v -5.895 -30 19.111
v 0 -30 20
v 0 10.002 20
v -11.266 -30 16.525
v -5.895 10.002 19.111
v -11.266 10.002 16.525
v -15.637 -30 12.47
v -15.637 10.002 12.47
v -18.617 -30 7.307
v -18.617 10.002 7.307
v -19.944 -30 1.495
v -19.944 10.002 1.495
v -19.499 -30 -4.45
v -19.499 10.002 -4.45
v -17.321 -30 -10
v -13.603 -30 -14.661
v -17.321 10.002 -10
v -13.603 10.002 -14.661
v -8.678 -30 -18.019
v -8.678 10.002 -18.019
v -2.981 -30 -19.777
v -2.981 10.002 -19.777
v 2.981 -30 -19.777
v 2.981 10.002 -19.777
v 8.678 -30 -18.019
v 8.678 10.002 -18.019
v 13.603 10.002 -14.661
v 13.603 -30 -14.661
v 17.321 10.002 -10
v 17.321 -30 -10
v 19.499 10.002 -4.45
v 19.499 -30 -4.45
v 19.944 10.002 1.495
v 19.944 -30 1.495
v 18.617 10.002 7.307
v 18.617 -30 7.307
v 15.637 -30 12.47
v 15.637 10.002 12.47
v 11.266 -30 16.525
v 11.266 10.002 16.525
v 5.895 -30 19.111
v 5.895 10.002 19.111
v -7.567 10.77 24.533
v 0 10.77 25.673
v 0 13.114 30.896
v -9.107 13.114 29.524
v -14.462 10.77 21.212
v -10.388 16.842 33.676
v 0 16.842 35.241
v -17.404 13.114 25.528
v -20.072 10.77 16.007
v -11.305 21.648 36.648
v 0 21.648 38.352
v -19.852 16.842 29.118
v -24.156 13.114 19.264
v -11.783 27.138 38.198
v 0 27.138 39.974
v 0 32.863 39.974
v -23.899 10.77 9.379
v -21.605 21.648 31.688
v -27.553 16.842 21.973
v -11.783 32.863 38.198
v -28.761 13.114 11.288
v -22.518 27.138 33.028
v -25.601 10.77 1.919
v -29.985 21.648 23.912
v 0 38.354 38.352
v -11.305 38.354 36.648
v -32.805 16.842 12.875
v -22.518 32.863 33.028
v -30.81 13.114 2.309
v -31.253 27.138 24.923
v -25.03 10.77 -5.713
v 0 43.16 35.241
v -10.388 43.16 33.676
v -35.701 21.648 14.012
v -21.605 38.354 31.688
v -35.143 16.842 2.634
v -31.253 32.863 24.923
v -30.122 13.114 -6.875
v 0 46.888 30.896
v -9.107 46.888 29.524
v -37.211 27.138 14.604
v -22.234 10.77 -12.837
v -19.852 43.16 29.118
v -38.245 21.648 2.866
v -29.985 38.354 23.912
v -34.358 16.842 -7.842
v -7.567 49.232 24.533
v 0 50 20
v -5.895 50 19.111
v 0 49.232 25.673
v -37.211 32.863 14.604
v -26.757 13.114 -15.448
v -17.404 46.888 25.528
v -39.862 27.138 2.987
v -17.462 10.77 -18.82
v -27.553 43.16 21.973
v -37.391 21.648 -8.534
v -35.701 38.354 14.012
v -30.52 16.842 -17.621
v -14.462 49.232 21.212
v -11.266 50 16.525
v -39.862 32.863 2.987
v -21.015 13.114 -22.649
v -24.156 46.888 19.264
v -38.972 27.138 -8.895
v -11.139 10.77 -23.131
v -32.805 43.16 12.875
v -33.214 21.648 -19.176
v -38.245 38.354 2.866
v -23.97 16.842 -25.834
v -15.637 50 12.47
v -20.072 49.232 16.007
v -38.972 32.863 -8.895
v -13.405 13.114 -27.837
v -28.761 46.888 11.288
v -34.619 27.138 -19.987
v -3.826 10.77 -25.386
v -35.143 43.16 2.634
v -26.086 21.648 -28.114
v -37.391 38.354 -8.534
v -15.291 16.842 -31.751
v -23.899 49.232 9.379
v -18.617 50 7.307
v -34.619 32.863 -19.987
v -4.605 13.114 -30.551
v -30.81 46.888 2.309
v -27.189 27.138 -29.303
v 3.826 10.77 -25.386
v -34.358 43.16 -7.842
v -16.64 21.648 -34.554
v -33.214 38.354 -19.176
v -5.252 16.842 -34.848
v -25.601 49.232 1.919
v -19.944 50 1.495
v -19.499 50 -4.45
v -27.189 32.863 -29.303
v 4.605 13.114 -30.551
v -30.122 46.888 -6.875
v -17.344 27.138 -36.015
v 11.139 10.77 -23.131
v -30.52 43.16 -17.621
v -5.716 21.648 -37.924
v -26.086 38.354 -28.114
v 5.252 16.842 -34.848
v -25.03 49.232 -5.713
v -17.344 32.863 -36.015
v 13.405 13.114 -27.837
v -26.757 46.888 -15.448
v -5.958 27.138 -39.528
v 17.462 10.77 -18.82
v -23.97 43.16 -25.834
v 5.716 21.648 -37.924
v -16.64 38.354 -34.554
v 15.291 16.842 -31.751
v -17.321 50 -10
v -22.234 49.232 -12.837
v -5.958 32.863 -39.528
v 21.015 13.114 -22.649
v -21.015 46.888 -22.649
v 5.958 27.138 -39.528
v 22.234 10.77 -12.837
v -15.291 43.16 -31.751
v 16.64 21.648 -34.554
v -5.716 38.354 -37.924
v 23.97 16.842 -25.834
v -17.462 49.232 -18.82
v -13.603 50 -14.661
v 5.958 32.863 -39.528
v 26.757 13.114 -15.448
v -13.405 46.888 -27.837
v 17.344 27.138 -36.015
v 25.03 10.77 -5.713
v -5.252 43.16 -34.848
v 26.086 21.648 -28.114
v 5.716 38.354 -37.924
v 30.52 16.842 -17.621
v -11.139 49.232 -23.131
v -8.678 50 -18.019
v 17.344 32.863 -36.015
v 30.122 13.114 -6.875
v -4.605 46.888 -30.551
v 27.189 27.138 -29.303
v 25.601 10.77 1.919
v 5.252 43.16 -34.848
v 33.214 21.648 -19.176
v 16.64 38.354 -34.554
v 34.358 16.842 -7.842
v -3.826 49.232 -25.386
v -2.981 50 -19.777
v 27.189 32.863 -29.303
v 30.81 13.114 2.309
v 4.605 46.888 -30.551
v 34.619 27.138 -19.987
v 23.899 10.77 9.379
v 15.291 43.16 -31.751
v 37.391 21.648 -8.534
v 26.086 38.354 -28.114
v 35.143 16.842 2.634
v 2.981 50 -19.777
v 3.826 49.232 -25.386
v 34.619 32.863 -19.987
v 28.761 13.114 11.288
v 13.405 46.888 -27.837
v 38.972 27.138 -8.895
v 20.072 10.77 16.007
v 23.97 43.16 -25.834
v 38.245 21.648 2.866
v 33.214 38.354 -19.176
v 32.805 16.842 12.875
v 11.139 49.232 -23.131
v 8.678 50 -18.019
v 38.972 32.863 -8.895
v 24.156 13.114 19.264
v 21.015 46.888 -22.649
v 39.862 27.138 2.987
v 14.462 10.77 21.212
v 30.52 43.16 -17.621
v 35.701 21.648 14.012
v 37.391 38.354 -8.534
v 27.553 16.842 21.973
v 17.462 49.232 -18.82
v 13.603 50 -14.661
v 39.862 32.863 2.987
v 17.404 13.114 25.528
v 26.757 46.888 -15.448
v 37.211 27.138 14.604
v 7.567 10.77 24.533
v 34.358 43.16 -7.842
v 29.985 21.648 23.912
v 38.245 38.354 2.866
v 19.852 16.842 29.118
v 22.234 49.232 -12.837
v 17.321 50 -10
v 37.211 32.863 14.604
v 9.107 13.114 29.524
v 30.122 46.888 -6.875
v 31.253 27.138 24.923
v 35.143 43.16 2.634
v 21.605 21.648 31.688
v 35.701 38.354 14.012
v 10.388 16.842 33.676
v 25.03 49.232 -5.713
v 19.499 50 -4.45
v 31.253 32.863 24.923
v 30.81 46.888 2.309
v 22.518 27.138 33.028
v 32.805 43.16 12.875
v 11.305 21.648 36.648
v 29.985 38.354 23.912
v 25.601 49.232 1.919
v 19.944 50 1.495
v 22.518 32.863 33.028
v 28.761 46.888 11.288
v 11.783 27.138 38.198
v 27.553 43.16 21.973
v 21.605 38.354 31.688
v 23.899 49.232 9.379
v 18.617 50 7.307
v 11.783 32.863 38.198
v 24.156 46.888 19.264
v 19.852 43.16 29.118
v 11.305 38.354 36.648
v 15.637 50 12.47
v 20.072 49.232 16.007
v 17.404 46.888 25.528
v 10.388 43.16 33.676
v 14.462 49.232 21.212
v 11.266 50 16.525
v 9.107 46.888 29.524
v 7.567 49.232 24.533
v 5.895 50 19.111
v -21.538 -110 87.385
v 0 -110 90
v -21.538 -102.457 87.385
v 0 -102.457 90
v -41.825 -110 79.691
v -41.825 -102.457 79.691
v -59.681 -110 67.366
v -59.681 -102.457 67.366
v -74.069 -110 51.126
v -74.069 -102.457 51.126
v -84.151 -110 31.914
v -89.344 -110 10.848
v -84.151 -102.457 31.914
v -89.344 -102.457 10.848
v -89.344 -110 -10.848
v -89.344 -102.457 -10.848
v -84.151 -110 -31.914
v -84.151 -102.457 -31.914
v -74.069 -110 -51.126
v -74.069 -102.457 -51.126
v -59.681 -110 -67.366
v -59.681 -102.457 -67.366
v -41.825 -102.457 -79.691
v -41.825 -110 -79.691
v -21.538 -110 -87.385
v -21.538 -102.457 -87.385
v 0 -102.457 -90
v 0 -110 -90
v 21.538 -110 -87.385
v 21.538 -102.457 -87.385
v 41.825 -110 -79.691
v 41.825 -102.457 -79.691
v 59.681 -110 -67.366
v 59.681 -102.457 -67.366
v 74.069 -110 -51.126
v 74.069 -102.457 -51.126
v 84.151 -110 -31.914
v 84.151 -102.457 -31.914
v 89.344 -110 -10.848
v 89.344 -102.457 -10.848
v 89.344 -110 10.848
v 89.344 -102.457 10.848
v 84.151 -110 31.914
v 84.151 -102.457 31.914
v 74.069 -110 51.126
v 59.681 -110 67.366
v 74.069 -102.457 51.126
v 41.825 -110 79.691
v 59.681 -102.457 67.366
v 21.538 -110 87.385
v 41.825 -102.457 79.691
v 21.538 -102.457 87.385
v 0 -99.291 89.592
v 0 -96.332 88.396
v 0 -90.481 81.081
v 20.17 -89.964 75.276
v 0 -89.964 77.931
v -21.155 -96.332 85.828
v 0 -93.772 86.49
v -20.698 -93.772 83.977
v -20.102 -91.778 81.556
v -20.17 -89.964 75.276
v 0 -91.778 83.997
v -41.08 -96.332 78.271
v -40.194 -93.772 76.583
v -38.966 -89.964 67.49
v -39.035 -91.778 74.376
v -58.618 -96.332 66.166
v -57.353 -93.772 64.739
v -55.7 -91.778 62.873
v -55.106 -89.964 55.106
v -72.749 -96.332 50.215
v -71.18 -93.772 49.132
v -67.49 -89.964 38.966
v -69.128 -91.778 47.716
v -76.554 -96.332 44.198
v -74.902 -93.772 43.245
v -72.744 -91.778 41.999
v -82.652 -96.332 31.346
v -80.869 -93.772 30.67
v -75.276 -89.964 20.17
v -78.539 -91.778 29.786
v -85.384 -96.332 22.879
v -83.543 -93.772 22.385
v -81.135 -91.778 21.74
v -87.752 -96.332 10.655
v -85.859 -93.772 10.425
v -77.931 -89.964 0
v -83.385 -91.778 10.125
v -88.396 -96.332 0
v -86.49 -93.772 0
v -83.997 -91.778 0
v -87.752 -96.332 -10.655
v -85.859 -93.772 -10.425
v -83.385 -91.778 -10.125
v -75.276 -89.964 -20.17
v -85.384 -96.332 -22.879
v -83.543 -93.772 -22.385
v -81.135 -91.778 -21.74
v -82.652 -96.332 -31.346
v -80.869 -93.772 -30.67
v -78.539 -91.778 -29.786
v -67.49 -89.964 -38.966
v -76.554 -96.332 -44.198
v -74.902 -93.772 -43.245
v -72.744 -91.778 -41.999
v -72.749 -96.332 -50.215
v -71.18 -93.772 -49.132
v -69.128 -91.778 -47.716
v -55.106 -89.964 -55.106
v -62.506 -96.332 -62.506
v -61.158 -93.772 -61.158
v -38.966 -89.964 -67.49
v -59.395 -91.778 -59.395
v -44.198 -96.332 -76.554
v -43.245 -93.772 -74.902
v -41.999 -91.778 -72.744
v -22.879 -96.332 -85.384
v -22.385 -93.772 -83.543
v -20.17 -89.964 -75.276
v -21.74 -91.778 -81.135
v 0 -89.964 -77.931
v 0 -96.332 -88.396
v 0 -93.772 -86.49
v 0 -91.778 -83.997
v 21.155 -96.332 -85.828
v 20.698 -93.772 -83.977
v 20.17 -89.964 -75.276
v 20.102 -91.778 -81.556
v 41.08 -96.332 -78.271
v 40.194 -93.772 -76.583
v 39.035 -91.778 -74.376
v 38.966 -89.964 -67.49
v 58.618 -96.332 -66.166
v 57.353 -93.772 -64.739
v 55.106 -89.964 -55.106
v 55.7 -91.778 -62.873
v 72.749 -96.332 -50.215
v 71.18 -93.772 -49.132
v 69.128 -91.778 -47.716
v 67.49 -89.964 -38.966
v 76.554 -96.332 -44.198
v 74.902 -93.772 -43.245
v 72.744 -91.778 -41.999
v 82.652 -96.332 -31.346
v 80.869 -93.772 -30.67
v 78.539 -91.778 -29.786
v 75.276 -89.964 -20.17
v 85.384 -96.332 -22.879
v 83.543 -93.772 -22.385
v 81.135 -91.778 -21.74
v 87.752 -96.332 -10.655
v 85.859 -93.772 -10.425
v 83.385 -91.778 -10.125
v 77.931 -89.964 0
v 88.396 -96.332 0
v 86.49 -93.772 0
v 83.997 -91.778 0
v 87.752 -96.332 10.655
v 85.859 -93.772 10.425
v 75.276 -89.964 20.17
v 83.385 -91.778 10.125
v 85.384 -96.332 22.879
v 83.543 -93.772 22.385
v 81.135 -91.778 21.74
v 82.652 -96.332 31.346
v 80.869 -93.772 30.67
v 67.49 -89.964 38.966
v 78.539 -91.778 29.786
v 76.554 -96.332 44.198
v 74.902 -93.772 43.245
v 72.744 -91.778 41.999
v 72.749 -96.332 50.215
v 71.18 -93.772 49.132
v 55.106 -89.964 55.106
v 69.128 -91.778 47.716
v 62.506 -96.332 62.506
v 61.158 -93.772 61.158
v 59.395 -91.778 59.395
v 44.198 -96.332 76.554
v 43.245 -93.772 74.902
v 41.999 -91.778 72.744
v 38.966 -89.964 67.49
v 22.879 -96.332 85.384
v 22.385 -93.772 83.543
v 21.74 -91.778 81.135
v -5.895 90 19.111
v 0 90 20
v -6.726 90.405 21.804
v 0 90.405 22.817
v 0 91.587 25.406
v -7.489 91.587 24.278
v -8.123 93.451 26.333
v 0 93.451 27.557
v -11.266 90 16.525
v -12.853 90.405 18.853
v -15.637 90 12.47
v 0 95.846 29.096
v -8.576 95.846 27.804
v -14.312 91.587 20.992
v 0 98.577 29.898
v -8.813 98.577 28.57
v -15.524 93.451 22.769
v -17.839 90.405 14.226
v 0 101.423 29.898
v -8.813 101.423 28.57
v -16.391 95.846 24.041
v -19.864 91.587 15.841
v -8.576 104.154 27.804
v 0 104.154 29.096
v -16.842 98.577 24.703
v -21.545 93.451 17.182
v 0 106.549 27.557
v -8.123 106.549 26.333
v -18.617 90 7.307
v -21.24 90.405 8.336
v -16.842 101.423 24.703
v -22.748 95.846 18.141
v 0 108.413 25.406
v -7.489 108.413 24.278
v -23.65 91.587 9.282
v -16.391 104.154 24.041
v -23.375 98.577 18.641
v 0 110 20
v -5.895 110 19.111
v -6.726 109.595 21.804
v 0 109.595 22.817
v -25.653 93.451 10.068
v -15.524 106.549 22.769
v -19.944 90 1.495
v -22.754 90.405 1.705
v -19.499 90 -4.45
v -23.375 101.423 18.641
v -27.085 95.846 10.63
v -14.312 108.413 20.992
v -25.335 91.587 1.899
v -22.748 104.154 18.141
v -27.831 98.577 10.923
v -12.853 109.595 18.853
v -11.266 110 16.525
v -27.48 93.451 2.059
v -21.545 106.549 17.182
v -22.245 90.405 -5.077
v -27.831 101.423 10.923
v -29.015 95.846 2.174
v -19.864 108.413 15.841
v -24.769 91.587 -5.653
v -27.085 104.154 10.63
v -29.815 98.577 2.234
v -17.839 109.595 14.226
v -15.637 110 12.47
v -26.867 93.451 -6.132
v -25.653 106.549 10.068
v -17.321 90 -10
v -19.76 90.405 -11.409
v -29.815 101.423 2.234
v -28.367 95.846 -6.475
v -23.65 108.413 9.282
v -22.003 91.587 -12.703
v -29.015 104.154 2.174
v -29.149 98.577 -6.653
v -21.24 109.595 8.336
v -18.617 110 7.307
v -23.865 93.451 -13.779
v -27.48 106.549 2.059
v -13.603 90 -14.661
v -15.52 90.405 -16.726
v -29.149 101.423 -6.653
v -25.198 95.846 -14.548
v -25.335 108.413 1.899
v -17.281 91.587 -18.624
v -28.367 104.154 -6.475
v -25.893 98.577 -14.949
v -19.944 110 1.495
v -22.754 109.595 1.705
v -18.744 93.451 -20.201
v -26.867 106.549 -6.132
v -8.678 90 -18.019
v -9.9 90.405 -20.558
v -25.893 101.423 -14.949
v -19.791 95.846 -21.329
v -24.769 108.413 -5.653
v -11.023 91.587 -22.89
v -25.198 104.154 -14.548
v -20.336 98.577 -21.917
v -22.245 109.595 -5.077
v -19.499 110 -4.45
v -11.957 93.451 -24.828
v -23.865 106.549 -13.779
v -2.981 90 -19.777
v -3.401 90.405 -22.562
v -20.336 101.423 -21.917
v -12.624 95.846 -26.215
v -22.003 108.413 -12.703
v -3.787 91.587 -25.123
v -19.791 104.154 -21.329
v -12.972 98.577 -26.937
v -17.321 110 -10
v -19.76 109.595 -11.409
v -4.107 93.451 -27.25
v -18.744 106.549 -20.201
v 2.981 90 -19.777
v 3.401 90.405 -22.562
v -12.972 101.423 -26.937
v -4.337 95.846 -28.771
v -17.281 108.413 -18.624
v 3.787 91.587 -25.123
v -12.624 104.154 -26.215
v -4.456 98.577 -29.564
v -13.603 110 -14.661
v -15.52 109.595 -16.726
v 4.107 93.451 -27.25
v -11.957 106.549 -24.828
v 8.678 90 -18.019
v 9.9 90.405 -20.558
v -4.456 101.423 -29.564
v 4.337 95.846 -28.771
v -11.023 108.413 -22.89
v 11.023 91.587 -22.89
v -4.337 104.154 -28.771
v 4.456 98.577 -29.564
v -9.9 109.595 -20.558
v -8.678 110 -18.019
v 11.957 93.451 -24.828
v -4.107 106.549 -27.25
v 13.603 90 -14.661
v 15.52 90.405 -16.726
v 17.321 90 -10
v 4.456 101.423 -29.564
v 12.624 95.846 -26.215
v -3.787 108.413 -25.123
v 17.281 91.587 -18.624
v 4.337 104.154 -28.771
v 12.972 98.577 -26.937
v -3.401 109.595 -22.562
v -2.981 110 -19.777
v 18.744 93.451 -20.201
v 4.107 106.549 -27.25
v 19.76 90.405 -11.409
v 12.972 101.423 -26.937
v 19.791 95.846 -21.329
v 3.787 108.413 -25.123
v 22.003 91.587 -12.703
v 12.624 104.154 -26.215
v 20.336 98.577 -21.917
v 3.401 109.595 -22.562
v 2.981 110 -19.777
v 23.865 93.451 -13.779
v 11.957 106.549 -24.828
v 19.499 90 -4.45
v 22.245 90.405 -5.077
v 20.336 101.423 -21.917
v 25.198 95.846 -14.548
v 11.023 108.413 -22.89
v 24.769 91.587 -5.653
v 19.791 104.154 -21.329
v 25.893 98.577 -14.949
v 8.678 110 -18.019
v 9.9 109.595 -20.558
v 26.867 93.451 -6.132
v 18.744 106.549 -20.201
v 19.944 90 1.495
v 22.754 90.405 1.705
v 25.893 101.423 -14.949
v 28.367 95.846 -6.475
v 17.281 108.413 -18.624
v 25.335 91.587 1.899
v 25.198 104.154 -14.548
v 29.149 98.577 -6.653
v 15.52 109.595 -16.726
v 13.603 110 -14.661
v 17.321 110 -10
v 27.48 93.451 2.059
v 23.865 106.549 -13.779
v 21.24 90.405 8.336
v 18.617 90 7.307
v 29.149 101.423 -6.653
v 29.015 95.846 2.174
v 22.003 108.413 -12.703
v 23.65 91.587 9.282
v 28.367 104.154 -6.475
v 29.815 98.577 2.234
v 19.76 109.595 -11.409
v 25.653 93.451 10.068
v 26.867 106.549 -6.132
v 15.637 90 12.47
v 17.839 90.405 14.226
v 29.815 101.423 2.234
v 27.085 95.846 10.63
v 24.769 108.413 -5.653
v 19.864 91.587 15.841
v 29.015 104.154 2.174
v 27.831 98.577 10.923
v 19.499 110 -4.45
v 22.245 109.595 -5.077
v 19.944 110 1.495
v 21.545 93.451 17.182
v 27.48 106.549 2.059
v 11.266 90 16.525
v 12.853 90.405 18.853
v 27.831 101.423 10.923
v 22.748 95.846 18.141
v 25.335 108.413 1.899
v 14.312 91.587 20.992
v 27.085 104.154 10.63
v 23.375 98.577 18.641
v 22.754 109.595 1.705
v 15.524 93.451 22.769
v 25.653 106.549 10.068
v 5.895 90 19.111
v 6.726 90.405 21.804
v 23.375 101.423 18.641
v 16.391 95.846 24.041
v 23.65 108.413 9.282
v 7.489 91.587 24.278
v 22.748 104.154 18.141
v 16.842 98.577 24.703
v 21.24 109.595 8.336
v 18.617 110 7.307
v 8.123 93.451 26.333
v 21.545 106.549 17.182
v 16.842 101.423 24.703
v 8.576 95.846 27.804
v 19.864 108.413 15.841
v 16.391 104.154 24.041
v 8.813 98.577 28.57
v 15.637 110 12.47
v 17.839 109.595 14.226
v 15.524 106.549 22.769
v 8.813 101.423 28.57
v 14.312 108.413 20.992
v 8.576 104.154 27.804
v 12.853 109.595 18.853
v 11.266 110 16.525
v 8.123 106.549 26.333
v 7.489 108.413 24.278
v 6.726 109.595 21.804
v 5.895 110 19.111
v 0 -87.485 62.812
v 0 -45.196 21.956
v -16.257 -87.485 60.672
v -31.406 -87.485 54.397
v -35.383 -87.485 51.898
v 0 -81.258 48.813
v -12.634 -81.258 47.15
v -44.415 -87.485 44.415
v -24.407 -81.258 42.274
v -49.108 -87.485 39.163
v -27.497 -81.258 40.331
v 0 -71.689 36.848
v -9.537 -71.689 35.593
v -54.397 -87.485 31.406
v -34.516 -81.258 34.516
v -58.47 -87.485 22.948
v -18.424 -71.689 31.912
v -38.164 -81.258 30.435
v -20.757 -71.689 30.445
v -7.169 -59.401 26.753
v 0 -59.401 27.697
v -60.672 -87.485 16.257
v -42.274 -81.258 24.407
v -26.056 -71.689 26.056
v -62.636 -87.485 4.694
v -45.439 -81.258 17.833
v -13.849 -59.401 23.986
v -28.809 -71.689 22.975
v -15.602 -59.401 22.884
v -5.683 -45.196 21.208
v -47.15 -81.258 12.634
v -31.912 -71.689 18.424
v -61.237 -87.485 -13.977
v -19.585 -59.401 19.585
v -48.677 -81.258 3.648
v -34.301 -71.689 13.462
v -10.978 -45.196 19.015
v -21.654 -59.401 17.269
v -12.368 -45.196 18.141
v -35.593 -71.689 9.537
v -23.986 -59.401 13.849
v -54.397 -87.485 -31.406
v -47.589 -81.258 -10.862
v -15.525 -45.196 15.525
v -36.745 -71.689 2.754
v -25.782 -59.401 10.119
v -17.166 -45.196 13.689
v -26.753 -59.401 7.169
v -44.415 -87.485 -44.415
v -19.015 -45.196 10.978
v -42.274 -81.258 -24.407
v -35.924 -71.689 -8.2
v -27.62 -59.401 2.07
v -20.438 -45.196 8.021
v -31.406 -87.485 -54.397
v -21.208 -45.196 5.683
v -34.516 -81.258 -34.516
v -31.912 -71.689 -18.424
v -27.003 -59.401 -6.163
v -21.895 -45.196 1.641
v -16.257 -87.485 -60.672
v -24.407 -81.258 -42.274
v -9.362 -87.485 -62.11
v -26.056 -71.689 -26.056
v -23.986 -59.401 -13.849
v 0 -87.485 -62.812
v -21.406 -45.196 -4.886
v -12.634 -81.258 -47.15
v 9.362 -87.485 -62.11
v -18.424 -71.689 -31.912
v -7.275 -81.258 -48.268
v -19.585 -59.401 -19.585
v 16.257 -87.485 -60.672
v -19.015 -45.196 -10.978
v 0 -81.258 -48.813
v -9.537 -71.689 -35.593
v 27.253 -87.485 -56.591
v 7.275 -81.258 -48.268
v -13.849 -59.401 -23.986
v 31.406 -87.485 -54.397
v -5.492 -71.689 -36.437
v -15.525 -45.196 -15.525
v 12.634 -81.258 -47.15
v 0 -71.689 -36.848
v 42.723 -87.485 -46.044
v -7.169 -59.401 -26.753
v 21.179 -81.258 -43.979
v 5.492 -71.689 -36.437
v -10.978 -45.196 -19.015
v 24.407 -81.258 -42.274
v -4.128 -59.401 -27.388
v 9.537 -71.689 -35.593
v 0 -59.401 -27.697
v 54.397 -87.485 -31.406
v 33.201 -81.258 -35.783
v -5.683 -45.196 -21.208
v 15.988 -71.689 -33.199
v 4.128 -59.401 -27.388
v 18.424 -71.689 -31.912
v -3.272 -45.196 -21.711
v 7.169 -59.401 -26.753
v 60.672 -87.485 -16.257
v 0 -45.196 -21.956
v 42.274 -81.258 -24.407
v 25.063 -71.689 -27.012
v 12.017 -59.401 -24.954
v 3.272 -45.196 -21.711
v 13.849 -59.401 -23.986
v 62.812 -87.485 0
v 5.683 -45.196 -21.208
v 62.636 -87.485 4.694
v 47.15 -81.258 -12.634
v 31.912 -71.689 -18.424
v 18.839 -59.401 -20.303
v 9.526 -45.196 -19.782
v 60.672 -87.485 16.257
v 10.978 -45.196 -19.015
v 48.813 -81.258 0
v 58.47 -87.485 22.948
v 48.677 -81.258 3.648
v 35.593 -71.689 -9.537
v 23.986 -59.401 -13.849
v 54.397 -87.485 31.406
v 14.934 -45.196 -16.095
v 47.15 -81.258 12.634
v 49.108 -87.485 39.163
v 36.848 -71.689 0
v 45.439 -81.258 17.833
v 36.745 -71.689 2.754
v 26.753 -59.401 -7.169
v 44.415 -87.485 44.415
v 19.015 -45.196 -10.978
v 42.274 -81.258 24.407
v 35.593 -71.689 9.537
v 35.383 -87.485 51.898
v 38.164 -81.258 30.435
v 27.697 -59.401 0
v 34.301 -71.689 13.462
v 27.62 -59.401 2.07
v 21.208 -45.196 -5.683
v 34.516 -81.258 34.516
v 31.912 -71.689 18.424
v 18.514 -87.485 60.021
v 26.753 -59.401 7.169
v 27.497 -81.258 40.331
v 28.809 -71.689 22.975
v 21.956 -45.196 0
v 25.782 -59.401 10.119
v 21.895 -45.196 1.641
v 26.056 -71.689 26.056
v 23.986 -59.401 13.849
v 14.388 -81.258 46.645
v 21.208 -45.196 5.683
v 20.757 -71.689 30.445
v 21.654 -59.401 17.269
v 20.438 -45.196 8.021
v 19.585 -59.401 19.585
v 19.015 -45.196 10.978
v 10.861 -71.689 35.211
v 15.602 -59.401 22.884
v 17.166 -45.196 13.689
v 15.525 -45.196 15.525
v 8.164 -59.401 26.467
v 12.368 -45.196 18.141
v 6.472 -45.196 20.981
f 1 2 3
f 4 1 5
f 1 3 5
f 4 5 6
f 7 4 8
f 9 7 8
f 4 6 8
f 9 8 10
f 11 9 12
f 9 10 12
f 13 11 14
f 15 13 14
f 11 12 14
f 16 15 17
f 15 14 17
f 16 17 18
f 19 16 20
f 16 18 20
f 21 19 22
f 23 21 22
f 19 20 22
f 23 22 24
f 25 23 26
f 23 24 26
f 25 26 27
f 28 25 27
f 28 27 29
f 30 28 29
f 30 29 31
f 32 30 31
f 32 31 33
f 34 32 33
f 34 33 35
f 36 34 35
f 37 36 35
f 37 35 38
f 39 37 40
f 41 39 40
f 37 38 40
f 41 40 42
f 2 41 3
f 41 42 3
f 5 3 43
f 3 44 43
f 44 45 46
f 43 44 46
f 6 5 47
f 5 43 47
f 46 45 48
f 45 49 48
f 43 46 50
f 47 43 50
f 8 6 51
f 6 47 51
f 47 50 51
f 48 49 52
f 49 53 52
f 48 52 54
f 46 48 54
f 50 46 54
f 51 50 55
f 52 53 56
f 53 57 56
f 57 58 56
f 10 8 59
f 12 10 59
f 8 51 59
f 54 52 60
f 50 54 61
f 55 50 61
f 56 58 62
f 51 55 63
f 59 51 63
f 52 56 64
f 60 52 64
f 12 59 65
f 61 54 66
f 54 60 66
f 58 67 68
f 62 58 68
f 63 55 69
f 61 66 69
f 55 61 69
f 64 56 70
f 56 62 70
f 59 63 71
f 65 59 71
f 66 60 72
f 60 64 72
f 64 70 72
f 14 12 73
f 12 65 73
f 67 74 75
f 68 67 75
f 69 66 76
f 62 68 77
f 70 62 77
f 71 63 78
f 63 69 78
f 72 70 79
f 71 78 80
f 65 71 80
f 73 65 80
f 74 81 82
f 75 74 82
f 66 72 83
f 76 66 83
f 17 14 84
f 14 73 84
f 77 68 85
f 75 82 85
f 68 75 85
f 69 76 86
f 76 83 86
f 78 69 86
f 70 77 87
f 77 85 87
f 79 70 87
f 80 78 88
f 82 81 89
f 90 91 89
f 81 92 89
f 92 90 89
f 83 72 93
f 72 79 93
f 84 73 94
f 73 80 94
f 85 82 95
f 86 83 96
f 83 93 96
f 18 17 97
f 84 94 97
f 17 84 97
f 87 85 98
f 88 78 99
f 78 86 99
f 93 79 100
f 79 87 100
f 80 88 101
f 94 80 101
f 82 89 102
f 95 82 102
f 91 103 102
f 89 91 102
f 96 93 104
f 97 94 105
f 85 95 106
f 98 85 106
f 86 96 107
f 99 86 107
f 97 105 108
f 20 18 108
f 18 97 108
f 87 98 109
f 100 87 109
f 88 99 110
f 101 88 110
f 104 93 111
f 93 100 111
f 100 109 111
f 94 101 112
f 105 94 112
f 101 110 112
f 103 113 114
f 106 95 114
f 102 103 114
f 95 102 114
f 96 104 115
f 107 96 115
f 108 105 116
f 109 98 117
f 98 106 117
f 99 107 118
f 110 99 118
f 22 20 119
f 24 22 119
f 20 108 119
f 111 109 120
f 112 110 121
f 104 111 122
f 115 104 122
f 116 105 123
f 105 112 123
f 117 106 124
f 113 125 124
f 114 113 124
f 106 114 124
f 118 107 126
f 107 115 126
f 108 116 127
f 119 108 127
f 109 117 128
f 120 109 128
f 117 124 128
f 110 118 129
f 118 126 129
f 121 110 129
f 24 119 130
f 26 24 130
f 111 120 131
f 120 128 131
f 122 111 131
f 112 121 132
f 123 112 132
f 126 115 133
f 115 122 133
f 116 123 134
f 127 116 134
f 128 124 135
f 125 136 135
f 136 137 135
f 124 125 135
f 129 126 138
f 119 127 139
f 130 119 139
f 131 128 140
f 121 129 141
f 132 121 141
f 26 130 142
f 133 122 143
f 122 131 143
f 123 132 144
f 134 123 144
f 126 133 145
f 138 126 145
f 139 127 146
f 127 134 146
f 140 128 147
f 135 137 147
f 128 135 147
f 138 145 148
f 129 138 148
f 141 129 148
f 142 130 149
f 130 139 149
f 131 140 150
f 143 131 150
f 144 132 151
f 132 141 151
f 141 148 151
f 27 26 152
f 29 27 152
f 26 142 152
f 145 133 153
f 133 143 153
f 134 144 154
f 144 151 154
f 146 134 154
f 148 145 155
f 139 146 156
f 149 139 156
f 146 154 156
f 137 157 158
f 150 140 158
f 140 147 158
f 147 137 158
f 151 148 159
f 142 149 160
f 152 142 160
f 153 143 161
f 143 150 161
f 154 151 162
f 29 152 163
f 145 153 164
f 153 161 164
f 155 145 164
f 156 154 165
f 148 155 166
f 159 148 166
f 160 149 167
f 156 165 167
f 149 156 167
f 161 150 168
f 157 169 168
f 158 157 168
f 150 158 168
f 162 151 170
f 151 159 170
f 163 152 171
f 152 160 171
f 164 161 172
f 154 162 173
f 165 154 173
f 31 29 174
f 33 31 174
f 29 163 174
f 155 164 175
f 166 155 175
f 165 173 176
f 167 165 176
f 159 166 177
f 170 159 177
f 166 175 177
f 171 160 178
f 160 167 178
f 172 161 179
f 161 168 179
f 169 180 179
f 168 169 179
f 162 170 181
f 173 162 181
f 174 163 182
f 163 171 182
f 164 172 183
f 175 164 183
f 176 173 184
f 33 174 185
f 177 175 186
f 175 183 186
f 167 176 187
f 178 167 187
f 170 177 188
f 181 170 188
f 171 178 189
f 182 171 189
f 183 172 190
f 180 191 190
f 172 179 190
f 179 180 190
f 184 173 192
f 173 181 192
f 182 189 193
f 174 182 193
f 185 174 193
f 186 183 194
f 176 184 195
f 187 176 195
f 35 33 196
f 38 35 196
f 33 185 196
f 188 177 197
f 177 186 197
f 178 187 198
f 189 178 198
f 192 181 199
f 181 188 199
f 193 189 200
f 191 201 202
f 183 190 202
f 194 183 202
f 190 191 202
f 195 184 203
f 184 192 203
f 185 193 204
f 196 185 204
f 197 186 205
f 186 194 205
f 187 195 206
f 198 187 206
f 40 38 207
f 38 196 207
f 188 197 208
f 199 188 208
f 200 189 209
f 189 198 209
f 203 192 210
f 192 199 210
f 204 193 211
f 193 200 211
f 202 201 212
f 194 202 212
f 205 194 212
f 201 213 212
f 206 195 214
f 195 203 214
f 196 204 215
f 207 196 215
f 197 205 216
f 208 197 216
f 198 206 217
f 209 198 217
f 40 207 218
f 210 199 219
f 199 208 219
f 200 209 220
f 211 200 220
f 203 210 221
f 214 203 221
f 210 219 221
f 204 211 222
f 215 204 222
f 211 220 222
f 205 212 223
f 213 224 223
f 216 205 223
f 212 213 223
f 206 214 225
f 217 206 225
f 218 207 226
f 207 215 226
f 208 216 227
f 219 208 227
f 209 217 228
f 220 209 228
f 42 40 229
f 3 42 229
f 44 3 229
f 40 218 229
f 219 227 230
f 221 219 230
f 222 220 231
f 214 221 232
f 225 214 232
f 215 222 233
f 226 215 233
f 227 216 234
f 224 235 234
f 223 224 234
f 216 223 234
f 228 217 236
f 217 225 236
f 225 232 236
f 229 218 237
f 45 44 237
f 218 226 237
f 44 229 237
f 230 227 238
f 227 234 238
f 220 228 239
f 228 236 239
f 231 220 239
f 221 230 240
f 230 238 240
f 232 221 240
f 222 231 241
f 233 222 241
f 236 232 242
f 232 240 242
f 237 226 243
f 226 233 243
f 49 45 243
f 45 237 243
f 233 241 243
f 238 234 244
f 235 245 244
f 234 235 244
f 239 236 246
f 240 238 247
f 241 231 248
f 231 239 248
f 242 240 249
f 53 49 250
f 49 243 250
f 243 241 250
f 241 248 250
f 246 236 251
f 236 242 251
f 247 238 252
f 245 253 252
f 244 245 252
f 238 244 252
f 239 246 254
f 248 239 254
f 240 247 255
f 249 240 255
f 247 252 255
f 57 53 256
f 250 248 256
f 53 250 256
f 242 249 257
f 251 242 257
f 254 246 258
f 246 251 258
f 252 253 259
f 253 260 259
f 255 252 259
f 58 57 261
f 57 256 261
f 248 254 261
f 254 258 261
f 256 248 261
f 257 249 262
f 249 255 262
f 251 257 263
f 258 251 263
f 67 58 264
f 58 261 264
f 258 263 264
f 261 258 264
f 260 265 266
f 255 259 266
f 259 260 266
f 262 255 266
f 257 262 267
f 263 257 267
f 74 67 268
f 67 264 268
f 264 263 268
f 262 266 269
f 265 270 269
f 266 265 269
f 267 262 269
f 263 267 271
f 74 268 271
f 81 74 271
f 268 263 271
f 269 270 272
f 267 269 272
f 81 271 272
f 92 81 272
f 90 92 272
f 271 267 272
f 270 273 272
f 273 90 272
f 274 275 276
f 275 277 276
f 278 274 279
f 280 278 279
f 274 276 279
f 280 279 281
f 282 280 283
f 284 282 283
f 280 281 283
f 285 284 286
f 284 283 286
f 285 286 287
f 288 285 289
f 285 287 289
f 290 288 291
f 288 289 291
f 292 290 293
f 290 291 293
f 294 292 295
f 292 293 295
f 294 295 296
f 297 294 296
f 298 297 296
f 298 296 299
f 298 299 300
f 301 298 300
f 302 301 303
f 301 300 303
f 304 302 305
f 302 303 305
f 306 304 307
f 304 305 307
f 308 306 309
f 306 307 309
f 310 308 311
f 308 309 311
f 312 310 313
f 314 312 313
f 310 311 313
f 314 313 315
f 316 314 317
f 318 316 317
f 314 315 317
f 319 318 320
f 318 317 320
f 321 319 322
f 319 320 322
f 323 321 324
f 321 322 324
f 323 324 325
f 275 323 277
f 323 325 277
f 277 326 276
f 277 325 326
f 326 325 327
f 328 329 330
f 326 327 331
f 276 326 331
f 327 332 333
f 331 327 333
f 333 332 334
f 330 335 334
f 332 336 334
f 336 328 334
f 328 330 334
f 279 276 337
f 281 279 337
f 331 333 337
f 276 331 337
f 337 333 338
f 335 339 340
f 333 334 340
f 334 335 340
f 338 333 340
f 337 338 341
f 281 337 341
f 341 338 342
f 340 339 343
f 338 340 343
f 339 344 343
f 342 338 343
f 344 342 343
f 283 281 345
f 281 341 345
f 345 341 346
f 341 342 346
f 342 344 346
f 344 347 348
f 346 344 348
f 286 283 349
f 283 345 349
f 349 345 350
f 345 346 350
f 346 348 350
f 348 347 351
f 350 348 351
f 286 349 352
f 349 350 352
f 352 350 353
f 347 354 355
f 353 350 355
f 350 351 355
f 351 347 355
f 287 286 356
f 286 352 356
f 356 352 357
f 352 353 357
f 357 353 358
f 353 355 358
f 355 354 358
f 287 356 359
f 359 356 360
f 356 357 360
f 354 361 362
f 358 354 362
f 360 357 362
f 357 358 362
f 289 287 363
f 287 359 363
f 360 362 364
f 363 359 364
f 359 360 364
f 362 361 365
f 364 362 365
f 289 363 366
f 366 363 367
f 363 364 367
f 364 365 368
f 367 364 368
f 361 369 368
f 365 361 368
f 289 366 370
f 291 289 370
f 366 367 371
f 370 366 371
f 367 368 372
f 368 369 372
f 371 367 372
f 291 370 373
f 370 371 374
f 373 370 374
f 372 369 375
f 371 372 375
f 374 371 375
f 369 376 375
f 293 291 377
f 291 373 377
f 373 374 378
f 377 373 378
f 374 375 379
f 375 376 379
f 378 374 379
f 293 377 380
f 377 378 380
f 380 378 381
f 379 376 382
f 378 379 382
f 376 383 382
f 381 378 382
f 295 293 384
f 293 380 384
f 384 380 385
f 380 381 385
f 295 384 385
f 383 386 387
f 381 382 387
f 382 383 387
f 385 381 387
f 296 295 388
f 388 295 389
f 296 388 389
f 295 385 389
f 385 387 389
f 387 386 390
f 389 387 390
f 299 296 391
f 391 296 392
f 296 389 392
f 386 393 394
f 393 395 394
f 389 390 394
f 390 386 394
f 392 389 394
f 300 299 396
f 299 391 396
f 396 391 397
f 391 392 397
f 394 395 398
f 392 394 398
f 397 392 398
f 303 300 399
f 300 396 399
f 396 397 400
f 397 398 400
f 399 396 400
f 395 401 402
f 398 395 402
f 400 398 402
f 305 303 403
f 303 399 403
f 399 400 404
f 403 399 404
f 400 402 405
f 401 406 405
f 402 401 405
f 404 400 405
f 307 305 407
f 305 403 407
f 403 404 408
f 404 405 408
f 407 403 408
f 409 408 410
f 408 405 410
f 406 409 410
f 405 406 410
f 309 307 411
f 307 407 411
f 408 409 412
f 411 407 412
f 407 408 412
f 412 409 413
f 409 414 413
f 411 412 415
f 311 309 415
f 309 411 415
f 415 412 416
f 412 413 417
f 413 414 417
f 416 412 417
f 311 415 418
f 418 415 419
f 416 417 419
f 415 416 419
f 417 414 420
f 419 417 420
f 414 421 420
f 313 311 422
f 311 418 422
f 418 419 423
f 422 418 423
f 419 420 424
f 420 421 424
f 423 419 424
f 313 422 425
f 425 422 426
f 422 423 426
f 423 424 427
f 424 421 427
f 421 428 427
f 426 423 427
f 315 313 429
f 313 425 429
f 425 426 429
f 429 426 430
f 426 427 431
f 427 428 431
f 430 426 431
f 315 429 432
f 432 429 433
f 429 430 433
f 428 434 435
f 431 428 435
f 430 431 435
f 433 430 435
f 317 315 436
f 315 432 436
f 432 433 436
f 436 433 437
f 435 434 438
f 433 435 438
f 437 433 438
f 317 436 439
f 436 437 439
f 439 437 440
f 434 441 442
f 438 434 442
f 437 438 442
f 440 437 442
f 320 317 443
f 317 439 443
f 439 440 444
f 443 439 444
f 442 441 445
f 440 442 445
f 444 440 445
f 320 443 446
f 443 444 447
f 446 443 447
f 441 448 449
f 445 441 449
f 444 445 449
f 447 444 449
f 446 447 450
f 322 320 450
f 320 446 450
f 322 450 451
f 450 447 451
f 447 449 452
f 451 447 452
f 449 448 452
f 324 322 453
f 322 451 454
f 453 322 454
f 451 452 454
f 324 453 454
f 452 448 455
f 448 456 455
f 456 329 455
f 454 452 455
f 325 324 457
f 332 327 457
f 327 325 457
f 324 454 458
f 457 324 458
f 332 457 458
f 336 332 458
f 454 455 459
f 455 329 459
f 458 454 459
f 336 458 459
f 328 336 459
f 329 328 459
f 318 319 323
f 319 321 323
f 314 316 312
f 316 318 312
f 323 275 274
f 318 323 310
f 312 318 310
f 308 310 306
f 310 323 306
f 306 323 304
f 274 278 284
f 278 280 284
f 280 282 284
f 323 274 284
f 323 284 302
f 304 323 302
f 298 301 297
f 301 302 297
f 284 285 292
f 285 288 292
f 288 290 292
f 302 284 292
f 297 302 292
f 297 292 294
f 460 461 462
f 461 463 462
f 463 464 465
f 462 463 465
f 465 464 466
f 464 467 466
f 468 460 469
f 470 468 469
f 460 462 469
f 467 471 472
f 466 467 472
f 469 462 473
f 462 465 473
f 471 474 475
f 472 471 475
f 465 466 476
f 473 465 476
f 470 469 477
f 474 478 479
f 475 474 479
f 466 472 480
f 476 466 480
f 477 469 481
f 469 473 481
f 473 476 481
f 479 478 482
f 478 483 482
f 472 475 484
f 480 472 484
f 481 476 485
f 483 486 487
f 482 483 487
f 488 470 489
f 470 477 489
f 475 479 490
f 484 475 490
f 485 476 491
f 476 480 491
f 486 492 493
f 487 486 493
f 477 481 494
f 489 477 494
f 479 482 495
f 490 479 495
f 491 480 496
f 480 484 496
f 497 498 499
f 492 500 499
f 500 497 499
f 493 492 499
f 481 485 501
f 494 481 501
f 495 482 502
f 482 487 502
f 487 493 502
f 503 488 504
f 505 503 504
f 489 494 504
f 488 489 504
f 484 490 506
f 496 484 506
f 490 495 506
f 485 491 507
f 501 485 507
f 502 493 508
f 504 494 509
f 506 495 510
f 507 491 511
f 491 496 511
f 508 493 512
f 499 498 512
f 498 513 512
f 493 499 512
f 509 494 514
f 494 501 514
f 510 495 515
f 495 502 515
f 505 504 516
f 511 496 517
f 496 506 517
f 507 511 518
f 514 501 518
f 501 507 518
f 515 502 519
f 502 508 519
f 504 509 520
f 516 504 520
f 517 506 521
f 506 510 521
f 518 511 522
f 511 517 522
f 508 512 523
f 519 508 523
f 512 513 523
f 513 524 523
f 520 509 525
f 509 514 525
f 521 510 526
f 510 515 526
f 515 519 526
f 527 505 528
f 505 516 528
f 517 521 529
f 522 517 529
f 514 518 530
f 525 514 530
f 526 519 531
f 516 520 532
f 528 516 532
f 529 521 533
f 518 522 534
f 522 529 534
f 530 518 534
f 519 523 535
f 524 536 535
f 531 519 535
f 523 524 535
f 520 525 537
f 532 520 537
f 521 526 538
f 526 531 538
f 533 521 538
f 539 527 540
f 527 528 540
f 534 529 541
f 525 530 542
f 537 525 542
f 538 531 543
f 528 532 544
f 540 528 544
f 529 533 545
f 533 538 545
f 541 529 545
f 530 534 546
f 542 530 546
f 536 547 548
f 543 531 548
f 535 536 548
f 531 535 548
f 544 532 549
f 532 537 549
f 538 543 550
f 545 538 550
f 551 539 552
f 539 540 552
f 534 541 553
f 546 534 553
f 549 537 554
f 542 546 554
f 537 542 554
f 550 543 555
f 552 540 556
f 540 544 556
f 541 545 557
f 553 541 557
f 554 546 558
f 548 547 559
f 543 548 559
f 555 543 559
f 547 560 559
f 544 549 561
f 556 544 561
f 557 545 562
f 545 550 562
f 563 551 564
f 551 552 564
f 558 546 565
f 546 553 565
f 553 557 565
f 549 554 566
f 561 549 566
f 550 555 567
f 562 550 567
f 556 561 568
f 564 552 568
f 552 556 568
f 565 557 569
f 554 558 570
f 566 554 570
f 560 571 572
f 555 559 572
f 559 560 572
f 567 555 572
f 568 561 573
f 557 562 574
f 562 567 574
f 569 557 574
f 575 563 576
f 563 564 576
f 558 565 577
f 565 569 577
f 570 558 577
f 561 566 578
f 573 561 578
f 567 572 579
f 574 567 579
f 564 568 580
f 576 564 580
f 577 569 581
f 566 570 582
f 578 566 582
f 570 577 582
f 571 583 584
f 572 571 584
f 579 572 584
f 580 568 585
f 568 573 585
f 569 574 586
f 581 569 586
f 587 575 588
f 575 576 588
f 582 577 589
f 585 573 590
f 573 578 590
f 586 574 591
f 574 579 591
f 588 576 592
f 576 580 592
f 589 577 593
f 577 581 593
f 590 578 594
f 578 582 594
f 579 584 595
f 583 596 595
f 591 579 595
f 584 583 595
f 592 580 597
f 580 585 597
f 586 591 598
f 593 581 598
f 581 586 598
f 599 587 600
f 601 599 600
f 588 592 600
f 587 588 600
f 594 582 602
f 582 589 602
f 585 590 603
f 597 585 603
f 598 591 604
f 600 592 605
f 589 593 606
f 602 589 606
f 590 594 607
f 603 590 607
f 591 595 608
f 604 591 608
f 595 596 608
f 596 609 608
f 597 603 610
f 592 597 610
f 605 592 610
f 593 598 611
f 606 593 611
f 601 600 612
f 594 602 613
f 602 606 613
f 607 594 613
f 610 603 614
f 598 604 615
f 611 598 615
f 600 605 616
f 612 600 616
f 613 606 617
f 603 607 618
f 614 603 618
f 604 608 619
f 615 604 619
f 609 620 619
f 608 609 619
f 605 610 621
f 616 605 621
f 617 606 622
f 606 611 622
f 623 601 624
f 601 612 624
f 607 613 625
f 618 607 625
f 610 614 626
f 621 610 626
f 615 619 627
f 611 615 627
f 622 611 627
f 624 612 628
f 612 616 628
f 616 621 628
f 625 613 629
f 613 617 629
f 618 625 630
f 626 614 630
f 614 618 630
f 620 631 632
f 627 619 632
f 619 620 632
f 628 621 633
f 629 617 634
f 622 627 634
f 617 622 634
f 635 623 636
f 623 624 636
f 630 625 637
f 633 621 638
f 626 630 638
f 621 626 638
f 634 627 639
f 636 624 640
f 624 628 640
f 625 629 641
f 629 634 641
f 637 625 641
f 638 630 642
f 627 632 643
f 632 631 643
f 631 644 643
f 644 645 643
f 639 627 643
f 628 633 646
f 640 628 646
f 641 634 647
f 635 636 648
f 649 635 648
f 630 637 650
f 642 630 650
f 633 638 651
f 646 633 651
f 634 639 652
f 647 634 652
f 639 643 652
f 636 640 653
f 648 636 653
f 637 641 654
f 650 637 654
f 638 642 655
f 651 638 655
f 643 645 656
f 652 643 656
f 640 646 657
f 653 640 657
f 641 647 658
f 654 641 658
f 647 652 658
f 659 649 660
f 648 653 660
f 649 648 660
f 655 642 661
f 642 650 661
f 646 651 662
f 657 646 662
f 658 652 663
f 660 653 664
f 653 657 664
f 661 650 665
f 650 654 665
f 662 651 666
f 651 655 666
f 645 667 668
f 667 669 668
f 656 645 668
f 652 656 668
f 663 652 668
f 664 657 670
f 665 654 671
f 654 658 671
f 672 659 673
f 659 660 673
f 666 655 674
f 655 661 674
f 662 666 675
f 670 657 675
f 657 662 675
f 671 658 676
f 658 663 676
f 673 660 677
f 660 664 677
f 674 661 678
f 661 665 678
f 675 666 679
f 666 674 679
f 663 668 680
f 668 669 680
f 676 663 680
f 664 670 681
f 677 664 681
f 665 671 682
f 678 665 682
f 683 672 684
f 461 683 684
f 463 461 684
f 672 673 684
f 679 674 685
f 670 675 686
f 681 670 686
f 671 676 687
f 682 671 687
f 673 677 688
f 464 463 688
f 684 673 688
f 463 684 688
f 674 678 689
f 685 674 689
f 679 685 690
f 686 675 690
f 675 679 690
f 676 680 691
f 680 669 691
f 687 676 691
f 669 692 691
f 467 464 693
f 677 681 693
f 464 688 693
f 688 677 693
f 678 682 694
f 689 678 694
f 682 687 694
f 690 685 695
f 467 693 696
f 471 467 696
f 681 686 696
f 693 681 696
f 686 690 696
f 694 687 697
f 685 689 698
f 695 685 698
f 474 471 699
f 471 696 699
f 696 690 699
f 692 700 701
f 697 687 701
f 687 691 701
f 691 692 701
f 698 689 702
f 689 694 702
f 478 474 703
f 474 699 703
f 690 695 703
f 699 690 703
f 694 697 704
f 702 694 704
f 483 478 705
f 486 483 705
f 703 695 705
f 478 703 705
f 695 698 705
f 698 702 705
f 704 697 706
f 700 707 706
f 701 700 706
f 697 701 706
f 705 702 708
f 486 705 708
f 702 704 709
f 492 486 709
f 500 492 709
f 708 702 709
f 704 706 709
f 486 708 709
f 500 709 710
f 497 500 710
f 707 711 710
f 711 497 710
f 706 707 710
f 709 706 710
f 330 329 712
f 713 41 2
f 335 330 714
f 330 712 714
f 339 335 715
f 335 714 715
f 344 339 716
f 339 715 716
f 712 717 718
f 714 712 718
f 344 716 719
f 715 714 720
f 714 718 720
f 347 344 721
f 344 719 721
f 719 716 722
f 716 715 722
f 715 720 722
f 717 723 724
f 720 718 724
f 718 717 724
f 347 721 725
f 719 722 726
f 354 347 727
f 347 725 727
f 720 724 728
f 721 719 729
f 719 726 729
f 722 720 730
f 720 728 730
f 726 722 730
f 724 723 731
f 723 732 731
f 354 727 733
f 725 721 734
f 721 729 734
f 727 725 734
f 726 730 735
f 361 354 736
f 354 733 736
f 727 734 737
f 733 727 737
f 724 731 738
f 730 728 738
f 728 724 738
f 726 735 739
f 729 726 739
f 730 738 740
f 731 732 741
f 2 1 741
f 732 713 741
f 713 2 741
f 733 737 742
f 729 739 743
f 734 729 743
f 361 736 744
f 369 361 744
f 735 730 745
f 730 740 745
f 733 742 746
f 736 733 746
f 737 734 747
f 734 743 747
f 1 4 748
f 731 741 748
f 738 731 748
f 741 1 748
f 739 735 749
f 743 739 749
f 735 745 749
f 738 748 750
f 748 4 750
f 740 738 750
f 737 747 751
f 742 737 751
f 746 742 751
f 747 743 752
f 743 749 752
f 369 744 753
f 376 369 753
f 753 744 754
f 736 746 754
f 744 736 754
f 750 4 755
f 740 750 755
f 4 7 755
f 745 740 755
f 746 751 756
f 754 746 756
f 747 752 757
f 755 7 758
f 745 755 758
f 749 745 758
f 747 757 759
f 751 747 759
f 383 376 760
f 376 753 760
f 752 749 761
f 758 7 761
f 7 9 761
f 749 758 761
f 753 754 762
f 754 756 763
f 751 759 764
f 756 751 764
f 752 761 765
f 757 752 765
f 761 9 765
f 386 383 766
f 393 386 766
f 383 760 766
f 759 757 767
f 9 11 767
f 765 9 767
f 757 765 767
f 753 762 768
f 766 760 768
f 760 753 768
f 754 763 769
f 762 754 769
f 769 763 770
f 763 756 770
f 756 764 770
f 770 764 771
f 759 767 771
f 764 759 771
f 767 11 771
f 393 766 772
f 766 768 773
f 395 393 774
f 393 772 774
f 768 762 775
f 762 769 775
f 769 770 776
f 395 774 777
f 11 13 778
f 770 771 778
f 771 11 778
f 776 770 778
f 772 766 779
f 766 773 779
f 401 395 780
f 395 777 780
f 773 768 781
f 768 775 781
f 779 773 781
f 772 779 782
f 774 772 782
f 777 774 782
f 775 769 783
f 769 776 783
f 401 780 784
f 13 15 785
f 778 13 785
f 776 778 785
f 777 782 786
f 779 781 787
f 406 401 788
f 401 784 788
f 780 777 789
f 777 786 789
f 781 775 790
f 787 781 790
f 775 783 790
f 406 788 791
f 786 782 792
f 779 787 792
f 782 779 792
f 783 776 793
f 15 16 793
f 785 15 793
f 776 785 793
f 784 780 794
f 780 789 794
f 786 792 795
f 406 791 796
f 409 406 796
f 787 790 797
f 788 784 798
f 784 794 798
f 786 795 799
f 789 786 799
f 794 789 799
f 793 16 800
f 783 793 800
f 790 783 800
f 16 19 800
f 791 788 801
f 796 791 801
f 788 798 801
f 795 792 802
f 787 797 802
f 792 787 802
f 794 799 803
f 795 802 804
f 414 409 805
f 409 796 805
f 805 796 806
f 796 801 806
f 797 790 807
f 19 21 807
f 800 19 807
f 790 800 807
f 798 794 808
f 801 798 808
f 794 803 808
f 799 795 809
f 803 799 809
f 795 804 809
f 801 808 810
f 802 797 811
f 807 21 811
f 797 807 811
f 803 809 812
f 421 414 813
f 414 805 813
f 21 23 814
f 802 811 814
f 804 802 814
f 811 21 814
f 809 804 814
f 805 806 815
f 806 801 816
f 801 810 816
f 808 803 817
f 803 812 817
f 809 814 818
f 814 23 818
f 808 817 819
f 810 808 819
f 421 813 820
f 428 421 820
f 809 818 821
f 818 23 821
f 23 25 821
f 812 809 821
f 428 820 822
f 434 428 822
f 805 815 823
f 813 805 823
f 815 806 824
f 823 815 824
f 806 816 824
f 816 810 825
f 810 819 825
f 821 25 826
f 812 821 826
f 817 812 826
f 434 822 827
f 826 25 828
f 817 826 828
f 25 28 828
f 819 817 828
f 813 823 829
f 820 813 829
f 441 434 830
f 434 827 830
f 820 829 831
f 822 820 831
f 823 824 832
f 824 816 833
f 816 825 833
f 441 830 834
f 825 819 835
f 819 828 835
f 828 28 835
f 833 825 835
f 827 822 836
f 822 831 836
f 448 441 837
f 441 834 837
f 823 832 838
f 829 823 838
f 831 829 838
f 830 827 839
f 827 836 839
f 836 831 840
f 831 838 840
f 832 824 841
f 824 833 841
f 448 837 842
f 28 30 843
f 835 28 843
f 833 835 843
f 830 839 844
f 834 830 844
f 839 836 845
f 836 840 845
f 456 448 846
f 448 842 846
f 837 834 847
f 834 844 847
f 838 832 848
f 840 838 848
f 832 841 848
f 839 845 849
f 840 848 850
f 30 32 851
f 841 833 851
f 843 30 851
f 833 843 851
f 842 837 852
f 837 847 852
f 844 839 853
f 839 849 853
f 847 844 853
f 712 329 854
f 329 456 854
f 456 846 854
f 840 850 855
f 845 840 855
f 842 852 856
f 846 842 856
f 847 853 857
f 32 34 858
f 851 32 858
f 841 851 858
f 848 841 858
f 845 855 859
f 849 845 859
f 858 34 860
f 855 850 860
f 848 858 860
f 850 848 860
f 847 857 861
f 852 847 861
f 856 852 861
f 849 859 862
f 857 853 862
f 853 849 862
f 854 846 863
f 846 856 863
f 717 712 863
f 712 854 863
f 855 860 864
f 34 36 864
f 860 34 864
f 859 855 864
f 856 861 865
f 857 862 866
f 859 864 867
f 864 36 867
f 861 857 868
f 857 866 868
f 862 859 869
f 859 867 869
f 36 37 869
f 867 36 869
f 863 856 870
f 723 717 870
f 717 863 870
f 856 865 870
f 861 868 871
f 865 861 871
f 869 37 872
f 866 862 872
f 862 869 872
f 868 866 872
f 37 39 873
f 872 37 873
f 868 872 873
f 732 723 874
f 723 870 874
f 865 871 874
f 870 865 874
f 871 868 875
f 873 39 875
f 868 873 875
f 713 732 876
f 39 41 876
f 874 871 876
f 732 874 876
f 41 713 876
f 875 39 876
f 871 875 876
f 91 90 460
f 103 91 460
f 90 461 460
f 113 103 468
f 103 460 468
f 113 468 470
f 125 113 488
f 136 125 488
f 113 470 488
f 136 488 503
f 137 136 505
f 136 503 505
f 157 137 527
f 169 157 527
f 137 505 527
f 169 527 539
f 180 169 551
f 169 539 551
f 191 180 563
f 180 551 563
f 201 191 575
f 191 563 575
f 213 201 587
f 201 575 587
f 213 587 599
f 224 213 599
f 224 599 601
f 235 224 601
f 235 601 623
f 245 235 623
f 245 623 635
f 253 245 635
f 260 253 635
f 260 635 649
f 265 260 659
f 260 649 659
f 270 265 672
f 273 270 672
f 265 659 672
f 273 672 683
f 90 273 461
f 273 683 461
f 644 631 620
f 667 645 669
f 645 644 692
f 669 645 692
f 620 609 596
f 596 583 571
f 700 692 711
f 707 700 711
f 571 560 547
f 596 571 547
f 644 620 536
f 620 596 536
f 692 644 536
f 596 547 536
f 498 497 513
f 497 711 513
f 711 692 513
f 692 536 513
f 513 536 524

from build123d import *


with BuildPart() as part:
    # Sketch2 → Revolve1 (revolve)
    with BuildSketch(Plane.XY, mode=Mode.PRIVATE) as revolve1_sk:
        with BuildLine():
            Line((0, 110), (0, -110))
            Line((0, -110), (90, -110))
            Line((90, -110), (90, -102.456883731))
            ThreePointArc((90, -102.456883731), (86.489936903, -93.771779559), (77.931034483, -89.96431757))
            ThreePointArc((77.931034483, -89.96431757), (36.848302866, -71.688500027), (20, -30))
            Line((20, -30), (20, 10.00162012))
            ThreePointArc((20, 10.00162012), (40.180004853, 30.00081006), (20, 50))
            Line((20, 50), (20, 90))
            ThreePointArc((20, 90), (30, 100), (20, 110))
            Line((20, 110), (0, 110))
        make_face()
    revolve(revolve1_sk.sketch.rotate(Axis((0, 110, 0), (0, -1, 0)), 90), axis=Axis((0, 110, 0), (0, -1, 0)))


solid = part.part
